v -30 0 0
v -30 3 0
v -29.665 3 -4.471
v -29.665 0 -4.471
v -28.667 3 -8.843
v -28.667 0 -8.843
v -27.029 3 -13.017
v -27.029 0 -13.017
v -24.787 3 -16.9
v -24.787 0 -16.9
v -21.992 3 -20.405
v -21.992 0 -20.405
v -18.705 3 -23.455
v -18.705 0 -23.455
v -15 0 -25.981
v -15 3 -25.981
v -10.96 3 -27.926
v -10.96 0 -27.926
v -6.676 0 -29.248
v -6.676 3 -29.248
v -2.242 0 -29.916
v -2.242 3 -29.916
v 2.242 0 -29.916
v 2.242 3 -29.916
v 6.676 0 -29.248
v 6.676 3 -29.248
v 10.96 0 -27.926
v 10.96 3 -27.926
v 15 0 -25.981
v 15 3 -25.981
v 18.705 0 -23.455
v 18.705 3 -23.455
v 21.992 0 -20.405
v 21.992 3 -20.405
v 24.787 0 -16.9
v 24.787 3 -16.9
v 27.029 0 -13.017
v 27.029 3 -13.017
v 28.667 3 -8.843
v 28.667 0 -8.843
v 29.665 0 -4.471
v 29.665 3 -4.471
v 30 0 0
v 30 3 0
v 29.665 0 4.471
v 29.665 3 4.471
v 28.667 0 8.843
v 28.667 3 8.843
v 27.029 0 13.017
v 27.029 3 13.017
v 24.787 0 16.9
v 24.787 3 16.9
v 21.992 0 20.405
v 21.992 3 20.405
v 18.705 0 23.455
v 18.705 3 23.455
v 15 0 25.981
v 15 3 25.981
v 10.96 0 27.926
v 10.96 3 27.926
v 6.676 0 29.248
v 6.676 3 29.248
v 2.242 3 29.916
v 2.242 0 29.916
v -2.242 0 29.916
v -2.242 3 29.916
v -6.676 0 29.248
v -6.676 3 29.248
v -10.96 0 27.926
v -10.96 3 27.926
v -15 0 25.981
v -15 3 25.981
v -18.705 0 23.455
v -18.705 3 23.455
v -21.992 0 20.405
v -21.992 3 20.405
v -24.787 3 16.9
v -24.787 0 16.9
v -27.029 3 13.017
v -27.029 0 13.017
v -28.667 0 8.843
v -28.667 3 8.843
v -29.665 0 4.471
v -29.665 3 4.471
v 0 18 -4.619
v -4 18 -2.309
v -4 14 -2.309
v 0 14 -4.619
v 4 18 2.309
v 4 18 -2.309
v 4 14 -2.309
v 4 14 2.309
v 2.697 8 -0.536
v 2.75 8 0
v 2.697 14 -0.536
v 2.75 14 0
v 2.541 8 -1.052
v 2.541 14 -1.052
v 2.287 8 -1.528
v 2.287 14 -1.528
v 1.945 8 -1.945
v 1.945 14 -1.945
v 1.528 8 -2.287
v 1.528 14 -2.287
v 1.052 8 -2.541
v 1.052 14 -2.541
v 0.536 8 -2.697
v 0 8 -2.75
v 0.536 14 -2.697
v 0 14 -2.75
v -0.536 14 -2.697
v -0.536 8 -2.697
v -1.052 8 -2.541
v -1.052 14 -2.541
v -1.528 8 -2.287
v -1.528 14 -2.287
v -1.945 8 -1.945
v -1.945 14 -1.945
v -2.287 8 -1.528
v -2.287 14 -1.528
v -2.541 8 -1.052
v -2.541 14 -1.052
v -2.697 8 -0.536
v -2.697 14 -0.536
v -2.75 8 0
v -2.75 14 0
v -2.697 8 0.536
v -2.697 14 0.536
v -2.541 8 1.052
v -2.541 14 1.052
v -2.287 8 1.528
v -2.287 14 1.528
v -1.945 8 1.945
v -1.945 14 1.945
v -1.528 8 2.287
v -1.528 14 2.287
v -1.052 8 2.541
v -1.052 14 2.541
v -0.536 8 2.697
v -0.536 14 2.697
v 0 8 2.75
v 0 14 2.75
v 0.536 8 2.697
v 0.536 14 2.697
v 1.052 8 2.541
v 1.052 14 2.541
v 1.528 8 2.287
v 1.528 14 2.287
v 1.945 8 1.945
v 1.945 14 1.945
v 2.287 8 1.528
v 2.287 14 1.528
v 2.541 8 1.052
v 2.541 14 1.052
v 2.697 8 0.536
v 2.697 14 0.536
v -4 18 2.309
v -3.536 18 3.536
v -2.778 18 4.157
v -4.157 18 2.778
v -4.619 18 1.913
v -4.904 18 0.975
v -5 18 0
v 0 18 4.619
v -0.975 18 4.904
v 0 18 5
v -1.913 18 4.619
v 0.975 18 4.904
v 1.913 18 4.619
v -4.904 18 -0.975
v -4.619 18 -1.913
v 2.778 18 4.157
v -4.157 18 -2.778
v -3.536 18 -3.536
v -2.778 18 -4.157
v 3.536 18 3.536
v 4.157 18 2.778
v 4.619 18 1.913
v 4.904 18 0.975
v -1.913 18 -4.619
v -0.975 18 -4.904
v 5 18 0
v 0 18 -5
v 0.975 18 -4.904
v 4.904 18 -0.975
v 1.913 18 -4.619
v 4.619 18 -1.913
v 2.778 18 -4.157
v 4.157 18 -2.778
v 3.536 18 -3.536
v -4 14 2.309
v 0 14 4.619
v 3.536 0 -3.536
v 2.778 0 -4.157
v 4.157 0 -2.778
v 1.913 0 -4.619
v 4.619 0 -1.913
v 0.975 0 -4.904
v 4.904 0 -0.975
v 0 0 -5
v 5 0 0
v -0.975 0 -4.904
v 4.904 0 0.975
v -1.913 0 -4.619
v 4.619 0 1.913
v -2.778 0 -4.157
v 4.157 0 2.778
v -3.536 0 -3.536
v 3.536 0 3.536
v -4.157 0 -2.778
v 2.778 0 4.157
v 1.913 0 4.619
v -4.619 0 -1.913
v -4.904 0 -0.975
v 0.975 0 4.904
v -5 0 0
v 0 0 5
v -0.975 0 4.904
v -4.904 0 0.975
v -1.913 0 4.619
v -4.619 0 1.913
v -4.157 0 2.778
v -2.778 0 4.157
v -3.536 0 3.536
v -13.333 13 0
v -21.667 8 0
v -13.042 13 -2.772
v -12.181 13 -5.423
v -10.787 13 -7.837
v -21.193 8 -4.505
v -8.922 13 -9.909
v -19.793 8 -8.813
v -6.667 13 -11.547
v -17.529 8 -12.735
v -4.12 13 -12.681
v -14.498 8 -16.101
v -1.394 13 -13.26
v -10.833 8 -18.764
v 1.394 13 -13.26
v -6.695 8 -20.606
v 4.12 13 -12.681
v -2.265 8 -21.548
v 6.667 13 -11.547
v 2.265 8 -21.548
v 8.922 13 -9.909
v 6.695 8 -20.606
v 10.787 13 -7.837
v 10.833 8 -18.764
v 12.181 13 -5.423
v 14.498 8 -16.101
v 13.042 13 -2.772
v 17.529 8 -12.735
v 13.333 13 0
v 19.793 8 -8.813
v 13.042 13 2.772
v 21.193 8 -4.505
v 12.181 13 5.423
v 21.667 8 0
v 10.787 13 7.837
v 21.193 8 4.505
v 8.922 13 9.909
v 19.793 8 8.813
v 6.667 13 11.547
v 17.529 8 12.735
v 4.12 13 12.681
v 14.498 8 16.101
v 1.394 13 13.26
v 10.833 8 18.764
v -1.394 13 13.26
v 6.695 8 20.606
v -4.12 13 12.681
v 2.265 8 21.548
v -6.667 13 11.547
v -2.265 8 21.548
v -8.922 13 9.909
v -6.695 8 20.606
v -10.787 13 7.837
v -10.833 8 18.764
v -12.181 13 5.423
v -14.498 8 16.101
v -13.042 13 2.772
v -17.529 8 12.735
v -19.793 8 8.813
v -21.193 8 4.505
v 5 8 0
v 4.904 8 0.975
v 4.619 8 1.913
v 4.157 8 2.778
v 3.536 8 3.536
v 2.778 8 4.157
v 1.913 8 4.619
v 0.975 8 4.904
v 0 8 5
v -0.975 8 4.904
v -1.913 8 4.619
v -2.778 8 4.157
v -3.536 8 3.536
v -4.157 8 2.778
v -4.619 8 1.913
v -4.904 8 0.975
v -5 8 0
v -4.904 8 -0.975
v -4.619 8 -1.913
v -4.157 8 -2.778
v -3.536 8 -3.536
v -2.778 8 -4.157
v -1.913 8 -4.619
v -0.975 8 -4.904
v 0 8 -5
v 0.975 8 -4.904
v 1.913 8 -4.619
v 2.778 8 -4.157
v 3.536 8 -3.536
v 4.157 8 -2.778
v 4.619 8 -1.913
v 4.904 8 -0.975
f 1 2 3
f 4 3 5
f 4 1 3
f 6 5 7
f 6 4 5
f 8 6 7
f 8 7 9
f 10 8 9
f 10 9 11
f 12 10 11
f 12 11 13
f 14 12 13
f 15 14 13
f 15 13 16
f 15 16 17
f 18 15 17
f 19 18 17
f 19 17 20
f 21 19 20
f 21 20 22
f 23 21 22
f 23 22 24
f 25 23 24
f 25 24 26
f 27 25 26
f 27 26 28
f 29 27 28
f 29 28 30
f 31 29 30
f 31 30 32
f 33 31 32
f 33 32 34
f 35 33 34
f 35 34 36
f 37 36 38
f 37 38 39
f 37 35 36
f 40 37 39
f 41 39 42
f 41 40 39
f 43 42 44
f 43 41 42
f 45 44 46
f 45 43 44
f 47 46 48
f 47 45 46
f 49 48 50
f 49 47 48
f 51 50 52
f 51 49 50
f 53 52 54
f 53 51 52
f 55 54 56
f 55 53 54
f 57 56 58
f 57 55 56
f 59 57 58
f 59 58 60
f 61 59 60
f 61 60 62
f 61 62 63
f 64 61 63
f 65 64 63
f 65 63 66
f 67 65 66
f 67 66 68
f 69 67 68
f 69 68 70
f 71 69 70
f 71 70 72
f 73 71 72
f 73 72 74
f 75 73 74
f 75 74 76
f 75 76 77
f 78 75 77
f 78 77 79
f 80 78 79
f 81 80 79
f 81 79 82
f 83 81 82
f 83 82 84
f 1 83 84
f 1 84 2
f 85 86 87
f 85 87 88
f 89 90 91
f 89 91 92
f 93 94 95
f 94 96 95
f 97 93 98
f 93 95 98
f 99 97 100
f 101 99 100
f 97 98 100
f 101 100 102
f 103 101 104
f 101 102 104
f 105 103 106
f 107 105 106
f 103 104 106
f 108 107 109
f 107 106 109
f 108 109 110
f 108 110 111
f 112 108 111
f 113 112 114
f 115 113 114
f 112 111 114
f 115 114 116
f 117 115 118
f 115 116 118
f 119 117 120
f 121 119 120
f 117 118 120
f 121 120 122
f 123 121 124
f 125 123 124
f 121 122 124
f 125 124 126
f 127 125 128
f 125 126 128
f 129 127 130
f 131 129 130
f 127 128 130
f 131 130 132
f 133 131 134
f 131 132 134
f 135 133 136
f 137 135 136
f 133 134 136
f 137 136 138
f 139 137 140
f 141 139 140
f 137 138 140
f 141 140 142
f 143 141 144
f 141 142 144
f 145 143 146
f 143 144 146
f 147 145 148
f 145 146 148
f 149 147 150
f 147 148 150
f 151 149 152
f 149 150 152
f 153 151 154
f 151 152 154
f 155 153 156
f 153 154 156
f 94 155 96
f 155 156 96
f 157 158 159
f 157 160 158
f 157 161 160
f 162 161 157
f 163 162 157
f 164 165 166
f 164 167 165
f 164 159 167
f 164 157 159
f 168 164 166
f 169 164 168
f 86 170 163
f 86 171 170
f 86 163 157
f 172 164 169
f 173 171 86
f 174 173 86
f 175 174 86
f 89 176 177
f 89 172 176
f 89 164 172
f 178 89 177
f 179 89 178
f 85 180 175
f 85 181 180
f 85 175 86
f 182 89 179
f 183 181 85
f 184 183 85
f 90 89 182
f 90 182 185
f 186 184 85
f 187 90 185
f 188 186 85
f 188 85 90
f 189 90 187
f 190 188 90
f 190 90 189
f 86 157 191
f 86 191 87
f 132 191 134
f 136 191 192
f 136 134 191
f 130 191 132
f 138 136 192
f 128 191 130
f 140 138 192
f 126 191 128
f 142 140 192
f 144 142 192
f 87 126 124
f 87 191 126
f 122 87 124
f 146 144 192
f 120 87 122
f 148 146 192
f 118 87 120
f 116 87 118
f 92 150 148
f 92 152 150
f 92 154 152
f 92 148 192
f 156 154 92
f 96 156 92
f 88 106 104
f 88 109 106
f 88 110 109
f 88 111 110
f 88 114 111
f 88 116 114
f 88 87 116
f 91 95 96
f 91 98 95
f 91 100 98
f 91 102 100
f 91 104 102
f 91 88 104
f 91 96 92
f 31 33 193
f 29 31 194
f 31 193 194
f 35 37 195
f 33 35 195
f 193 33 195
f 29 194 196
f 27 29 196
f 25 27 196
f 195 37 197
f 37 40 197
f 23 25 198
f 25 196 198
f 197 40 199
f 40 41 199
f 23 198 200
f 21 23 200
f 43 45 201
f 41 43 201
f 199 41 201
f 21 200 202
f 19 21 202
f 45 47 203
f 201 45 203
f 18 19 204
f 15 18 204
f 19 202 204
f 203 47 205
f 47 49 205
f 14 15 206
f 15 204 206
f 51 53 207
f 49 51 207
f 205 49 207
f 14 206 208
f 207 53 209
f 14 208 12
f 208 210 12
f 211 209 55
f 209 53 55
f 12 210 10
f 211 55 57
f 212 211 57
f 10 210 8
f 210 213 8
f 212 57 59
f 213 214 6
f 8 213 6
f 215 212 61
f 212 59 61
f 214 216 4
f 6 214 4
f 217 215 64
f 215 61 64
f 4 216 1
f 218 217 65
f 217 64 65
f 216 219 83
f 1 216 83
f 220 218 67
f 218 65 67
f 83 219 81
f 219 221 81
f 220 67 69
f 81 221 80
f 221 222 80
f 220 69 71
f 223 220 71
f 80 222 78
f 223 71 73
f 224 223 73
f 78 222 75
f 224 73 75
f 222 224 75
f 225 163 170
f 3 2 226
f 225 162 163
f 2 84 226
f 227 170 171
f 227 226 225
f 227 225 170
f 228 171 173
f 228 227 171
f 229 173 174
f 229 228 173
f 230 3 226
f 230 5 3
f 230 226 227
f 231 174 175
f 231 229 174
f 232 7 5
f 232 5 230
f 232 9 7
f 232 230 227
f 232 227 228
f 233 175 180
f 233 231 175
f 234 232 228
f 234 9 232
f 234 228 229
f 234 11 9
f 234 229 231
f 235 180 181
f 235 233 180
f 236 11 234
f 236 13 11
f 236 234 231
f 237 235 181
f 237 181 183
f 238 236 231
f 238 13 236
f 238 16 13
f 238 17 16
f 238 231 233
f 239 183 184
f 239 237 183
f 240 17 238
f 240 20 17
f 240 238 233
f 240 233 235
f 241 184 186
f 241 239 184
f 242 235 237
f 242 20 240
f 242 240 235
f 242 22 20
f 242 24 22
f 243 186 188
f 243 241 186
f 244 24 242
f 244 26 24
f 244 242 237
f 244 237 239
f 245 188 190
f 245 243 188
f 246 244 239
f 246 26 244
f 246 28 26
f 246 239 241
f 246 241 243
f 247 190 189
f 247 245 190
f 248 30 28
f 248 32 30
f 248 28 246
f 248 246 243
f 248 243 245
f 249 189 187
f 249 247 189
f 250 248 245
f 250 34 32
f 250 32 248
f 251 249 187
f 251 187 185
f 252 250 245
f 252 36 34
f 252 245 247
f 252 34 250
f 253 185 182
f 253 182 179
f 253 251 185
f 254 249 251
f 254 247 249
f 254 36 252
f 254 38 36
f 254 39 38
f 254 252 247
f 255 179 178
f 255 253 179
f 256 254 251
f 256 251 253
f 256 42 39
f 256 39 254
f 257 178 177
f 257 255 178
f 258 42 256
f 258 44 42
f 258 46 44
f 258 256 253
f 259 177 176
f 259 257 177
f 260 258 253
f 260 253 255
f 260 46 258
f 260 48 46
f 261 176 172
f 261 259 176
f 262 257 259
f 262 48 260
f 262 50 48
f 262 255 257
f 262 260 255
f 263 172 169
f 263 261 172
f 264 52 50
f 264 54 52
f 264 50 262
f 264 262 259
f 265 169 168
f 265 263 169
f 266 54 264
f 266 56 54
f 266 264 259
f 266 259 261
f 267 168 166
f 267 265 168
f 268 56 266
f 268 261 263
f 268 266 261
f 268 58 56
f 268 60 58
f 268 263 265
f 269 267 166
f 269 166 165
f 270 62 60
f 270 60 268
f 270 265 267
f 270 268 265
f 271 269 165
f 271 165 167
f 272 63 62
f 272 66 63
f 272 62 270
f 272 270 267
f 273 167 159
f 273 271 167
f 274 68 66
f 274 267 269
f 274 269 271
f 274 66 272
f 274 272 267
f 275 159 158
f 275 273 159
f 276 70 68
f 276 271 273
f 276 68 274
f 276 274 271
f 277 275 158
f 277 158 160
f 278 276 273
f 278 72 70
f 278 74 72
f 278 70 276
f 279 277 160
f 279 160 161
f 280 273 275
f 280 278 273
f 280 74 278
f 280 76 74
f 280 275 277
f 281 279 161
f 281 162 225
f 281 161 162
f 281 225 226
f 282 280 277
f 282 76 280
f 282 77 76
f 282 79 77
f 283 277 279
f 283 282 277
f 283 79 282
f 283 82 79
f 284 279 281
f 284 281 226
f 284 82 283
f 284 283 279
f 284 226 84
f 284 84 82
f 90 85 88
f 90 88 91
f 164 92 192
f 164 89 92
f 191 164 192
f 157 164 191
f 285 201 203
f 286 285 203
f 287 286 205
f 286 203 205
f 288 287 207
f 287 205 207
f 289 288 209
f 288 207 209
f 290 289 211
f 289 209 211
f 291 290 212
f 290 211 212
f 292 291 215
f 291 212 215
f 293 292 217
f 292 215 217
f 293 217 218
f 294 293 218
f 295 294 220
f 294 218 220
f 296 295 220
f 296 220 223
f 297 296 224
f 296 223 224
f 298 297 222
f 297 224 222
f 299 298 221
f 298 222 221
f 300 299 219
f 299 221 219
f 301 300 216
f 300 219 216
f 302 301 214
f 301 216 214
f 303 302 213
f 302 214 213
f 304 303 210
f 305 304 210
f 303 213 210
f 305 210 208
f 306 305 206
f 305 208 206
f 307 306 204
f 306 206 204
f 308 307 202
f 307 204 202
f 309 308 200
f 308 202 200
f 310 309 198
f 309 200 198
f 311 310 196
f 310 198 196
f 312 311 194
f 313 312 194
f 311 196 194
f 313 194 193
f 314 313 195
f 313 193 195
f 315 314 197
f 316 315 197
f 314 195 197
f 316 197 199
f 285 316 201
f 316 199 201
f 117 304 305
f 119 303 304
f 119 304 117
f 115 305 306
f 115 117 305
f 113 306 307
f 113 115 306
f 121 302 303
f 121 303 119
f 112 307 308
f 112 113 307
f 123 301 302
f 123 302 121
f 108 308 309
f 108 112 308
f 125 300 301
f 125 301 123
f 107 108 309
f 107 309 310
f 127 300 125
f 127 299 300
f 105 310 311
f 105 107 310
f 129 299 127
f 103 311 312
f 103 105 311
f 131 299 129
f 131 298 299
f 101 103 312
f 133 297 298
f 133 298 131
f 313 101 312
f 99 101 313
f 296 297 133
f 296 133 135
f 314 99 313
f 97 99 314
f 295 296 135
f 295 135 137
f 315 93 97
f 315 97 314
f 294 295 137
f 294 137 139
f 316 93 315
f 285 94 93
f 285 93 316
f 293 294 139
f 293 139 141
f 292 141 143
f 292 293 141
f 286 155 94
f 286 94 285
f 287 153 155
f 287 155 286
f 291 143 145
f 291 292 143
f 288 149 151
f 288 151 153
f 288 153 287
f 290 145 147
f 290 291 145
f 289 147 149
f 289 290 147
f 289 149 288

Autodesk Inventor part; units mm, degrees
ref_plane "YZ Plane" through (0, 0, 0) normal (1, 0, 0) x (0, 1, 0)
ref_plane "XZ Plane" through (0, 0, 0) normal (0, 1, 0) x (-1, 0, 0)
sketch "Sketch1" plane through (0, 0, 0) normal (0, 1, 0) x (-1, 0, 0)
  circle A0 centre (0, 0) radius 30
  dimension "d0" = 60
extrude "Extrusion1" add sketch "Sketch1" along normal blind 3
ref_plane "Work Plane1" through (0, 18, 0) normal (0, 1, 0) x (1, 0, 0)
sketch "Sketch2" plane through (0, 18, 0) normal (0, 1, 0) x (1, 0, 0)
  circle A0 centre (0, 0) radius 5
  dimension "d5" = 10
loft "Loft1" add profiles "Sketch2" section 1 edges at (30, 3, 0)
sketch "Sketch3" plane through (0, 0, 0) normal (0, -1, 0) x (1, 0, 0)
  circle A0 centre (0, 0) radius 5
  dimension "d10" = 10
extrude "Extrusion2" cut sketch "Sketch3" against normal blind 8
sketch "Sketch5" plane through (0, 18, 0) normal (0, 1, 0) x (1, 0, 0)
  circle A0 centre (0, 0) radius 2.75
  dimension "d16" = 5.5
extrude "Extrusion4" cut sketch "Sketch5" against normal through all
sketch "Sketch6" plane through (0, 18, 0) normal (0, 1, 0) x (1, 0, 0)
  line L0 (0, 4.6188) -> (4, 2.3094)
  line L1 (4, 2.3094) -> (4, -2.3094)
  line L2 (4, -2.3094) -> (0, -4.6188)
  line L3 (0, -4.6188) -> (-4, -2.3094)
  line L4 (-4, -2.3094) -> (-4, 2.3094)
  line L5 (-4, 2.3094) -> (0, 4.6188)
  point P0 (0, 0)
  point P1 (0, 0)
  dimension "d19" = 8
extrude "Extrusion5" cut sketch "Sketch6" against normal blind 4
properties part number "Bottom_Foot"
